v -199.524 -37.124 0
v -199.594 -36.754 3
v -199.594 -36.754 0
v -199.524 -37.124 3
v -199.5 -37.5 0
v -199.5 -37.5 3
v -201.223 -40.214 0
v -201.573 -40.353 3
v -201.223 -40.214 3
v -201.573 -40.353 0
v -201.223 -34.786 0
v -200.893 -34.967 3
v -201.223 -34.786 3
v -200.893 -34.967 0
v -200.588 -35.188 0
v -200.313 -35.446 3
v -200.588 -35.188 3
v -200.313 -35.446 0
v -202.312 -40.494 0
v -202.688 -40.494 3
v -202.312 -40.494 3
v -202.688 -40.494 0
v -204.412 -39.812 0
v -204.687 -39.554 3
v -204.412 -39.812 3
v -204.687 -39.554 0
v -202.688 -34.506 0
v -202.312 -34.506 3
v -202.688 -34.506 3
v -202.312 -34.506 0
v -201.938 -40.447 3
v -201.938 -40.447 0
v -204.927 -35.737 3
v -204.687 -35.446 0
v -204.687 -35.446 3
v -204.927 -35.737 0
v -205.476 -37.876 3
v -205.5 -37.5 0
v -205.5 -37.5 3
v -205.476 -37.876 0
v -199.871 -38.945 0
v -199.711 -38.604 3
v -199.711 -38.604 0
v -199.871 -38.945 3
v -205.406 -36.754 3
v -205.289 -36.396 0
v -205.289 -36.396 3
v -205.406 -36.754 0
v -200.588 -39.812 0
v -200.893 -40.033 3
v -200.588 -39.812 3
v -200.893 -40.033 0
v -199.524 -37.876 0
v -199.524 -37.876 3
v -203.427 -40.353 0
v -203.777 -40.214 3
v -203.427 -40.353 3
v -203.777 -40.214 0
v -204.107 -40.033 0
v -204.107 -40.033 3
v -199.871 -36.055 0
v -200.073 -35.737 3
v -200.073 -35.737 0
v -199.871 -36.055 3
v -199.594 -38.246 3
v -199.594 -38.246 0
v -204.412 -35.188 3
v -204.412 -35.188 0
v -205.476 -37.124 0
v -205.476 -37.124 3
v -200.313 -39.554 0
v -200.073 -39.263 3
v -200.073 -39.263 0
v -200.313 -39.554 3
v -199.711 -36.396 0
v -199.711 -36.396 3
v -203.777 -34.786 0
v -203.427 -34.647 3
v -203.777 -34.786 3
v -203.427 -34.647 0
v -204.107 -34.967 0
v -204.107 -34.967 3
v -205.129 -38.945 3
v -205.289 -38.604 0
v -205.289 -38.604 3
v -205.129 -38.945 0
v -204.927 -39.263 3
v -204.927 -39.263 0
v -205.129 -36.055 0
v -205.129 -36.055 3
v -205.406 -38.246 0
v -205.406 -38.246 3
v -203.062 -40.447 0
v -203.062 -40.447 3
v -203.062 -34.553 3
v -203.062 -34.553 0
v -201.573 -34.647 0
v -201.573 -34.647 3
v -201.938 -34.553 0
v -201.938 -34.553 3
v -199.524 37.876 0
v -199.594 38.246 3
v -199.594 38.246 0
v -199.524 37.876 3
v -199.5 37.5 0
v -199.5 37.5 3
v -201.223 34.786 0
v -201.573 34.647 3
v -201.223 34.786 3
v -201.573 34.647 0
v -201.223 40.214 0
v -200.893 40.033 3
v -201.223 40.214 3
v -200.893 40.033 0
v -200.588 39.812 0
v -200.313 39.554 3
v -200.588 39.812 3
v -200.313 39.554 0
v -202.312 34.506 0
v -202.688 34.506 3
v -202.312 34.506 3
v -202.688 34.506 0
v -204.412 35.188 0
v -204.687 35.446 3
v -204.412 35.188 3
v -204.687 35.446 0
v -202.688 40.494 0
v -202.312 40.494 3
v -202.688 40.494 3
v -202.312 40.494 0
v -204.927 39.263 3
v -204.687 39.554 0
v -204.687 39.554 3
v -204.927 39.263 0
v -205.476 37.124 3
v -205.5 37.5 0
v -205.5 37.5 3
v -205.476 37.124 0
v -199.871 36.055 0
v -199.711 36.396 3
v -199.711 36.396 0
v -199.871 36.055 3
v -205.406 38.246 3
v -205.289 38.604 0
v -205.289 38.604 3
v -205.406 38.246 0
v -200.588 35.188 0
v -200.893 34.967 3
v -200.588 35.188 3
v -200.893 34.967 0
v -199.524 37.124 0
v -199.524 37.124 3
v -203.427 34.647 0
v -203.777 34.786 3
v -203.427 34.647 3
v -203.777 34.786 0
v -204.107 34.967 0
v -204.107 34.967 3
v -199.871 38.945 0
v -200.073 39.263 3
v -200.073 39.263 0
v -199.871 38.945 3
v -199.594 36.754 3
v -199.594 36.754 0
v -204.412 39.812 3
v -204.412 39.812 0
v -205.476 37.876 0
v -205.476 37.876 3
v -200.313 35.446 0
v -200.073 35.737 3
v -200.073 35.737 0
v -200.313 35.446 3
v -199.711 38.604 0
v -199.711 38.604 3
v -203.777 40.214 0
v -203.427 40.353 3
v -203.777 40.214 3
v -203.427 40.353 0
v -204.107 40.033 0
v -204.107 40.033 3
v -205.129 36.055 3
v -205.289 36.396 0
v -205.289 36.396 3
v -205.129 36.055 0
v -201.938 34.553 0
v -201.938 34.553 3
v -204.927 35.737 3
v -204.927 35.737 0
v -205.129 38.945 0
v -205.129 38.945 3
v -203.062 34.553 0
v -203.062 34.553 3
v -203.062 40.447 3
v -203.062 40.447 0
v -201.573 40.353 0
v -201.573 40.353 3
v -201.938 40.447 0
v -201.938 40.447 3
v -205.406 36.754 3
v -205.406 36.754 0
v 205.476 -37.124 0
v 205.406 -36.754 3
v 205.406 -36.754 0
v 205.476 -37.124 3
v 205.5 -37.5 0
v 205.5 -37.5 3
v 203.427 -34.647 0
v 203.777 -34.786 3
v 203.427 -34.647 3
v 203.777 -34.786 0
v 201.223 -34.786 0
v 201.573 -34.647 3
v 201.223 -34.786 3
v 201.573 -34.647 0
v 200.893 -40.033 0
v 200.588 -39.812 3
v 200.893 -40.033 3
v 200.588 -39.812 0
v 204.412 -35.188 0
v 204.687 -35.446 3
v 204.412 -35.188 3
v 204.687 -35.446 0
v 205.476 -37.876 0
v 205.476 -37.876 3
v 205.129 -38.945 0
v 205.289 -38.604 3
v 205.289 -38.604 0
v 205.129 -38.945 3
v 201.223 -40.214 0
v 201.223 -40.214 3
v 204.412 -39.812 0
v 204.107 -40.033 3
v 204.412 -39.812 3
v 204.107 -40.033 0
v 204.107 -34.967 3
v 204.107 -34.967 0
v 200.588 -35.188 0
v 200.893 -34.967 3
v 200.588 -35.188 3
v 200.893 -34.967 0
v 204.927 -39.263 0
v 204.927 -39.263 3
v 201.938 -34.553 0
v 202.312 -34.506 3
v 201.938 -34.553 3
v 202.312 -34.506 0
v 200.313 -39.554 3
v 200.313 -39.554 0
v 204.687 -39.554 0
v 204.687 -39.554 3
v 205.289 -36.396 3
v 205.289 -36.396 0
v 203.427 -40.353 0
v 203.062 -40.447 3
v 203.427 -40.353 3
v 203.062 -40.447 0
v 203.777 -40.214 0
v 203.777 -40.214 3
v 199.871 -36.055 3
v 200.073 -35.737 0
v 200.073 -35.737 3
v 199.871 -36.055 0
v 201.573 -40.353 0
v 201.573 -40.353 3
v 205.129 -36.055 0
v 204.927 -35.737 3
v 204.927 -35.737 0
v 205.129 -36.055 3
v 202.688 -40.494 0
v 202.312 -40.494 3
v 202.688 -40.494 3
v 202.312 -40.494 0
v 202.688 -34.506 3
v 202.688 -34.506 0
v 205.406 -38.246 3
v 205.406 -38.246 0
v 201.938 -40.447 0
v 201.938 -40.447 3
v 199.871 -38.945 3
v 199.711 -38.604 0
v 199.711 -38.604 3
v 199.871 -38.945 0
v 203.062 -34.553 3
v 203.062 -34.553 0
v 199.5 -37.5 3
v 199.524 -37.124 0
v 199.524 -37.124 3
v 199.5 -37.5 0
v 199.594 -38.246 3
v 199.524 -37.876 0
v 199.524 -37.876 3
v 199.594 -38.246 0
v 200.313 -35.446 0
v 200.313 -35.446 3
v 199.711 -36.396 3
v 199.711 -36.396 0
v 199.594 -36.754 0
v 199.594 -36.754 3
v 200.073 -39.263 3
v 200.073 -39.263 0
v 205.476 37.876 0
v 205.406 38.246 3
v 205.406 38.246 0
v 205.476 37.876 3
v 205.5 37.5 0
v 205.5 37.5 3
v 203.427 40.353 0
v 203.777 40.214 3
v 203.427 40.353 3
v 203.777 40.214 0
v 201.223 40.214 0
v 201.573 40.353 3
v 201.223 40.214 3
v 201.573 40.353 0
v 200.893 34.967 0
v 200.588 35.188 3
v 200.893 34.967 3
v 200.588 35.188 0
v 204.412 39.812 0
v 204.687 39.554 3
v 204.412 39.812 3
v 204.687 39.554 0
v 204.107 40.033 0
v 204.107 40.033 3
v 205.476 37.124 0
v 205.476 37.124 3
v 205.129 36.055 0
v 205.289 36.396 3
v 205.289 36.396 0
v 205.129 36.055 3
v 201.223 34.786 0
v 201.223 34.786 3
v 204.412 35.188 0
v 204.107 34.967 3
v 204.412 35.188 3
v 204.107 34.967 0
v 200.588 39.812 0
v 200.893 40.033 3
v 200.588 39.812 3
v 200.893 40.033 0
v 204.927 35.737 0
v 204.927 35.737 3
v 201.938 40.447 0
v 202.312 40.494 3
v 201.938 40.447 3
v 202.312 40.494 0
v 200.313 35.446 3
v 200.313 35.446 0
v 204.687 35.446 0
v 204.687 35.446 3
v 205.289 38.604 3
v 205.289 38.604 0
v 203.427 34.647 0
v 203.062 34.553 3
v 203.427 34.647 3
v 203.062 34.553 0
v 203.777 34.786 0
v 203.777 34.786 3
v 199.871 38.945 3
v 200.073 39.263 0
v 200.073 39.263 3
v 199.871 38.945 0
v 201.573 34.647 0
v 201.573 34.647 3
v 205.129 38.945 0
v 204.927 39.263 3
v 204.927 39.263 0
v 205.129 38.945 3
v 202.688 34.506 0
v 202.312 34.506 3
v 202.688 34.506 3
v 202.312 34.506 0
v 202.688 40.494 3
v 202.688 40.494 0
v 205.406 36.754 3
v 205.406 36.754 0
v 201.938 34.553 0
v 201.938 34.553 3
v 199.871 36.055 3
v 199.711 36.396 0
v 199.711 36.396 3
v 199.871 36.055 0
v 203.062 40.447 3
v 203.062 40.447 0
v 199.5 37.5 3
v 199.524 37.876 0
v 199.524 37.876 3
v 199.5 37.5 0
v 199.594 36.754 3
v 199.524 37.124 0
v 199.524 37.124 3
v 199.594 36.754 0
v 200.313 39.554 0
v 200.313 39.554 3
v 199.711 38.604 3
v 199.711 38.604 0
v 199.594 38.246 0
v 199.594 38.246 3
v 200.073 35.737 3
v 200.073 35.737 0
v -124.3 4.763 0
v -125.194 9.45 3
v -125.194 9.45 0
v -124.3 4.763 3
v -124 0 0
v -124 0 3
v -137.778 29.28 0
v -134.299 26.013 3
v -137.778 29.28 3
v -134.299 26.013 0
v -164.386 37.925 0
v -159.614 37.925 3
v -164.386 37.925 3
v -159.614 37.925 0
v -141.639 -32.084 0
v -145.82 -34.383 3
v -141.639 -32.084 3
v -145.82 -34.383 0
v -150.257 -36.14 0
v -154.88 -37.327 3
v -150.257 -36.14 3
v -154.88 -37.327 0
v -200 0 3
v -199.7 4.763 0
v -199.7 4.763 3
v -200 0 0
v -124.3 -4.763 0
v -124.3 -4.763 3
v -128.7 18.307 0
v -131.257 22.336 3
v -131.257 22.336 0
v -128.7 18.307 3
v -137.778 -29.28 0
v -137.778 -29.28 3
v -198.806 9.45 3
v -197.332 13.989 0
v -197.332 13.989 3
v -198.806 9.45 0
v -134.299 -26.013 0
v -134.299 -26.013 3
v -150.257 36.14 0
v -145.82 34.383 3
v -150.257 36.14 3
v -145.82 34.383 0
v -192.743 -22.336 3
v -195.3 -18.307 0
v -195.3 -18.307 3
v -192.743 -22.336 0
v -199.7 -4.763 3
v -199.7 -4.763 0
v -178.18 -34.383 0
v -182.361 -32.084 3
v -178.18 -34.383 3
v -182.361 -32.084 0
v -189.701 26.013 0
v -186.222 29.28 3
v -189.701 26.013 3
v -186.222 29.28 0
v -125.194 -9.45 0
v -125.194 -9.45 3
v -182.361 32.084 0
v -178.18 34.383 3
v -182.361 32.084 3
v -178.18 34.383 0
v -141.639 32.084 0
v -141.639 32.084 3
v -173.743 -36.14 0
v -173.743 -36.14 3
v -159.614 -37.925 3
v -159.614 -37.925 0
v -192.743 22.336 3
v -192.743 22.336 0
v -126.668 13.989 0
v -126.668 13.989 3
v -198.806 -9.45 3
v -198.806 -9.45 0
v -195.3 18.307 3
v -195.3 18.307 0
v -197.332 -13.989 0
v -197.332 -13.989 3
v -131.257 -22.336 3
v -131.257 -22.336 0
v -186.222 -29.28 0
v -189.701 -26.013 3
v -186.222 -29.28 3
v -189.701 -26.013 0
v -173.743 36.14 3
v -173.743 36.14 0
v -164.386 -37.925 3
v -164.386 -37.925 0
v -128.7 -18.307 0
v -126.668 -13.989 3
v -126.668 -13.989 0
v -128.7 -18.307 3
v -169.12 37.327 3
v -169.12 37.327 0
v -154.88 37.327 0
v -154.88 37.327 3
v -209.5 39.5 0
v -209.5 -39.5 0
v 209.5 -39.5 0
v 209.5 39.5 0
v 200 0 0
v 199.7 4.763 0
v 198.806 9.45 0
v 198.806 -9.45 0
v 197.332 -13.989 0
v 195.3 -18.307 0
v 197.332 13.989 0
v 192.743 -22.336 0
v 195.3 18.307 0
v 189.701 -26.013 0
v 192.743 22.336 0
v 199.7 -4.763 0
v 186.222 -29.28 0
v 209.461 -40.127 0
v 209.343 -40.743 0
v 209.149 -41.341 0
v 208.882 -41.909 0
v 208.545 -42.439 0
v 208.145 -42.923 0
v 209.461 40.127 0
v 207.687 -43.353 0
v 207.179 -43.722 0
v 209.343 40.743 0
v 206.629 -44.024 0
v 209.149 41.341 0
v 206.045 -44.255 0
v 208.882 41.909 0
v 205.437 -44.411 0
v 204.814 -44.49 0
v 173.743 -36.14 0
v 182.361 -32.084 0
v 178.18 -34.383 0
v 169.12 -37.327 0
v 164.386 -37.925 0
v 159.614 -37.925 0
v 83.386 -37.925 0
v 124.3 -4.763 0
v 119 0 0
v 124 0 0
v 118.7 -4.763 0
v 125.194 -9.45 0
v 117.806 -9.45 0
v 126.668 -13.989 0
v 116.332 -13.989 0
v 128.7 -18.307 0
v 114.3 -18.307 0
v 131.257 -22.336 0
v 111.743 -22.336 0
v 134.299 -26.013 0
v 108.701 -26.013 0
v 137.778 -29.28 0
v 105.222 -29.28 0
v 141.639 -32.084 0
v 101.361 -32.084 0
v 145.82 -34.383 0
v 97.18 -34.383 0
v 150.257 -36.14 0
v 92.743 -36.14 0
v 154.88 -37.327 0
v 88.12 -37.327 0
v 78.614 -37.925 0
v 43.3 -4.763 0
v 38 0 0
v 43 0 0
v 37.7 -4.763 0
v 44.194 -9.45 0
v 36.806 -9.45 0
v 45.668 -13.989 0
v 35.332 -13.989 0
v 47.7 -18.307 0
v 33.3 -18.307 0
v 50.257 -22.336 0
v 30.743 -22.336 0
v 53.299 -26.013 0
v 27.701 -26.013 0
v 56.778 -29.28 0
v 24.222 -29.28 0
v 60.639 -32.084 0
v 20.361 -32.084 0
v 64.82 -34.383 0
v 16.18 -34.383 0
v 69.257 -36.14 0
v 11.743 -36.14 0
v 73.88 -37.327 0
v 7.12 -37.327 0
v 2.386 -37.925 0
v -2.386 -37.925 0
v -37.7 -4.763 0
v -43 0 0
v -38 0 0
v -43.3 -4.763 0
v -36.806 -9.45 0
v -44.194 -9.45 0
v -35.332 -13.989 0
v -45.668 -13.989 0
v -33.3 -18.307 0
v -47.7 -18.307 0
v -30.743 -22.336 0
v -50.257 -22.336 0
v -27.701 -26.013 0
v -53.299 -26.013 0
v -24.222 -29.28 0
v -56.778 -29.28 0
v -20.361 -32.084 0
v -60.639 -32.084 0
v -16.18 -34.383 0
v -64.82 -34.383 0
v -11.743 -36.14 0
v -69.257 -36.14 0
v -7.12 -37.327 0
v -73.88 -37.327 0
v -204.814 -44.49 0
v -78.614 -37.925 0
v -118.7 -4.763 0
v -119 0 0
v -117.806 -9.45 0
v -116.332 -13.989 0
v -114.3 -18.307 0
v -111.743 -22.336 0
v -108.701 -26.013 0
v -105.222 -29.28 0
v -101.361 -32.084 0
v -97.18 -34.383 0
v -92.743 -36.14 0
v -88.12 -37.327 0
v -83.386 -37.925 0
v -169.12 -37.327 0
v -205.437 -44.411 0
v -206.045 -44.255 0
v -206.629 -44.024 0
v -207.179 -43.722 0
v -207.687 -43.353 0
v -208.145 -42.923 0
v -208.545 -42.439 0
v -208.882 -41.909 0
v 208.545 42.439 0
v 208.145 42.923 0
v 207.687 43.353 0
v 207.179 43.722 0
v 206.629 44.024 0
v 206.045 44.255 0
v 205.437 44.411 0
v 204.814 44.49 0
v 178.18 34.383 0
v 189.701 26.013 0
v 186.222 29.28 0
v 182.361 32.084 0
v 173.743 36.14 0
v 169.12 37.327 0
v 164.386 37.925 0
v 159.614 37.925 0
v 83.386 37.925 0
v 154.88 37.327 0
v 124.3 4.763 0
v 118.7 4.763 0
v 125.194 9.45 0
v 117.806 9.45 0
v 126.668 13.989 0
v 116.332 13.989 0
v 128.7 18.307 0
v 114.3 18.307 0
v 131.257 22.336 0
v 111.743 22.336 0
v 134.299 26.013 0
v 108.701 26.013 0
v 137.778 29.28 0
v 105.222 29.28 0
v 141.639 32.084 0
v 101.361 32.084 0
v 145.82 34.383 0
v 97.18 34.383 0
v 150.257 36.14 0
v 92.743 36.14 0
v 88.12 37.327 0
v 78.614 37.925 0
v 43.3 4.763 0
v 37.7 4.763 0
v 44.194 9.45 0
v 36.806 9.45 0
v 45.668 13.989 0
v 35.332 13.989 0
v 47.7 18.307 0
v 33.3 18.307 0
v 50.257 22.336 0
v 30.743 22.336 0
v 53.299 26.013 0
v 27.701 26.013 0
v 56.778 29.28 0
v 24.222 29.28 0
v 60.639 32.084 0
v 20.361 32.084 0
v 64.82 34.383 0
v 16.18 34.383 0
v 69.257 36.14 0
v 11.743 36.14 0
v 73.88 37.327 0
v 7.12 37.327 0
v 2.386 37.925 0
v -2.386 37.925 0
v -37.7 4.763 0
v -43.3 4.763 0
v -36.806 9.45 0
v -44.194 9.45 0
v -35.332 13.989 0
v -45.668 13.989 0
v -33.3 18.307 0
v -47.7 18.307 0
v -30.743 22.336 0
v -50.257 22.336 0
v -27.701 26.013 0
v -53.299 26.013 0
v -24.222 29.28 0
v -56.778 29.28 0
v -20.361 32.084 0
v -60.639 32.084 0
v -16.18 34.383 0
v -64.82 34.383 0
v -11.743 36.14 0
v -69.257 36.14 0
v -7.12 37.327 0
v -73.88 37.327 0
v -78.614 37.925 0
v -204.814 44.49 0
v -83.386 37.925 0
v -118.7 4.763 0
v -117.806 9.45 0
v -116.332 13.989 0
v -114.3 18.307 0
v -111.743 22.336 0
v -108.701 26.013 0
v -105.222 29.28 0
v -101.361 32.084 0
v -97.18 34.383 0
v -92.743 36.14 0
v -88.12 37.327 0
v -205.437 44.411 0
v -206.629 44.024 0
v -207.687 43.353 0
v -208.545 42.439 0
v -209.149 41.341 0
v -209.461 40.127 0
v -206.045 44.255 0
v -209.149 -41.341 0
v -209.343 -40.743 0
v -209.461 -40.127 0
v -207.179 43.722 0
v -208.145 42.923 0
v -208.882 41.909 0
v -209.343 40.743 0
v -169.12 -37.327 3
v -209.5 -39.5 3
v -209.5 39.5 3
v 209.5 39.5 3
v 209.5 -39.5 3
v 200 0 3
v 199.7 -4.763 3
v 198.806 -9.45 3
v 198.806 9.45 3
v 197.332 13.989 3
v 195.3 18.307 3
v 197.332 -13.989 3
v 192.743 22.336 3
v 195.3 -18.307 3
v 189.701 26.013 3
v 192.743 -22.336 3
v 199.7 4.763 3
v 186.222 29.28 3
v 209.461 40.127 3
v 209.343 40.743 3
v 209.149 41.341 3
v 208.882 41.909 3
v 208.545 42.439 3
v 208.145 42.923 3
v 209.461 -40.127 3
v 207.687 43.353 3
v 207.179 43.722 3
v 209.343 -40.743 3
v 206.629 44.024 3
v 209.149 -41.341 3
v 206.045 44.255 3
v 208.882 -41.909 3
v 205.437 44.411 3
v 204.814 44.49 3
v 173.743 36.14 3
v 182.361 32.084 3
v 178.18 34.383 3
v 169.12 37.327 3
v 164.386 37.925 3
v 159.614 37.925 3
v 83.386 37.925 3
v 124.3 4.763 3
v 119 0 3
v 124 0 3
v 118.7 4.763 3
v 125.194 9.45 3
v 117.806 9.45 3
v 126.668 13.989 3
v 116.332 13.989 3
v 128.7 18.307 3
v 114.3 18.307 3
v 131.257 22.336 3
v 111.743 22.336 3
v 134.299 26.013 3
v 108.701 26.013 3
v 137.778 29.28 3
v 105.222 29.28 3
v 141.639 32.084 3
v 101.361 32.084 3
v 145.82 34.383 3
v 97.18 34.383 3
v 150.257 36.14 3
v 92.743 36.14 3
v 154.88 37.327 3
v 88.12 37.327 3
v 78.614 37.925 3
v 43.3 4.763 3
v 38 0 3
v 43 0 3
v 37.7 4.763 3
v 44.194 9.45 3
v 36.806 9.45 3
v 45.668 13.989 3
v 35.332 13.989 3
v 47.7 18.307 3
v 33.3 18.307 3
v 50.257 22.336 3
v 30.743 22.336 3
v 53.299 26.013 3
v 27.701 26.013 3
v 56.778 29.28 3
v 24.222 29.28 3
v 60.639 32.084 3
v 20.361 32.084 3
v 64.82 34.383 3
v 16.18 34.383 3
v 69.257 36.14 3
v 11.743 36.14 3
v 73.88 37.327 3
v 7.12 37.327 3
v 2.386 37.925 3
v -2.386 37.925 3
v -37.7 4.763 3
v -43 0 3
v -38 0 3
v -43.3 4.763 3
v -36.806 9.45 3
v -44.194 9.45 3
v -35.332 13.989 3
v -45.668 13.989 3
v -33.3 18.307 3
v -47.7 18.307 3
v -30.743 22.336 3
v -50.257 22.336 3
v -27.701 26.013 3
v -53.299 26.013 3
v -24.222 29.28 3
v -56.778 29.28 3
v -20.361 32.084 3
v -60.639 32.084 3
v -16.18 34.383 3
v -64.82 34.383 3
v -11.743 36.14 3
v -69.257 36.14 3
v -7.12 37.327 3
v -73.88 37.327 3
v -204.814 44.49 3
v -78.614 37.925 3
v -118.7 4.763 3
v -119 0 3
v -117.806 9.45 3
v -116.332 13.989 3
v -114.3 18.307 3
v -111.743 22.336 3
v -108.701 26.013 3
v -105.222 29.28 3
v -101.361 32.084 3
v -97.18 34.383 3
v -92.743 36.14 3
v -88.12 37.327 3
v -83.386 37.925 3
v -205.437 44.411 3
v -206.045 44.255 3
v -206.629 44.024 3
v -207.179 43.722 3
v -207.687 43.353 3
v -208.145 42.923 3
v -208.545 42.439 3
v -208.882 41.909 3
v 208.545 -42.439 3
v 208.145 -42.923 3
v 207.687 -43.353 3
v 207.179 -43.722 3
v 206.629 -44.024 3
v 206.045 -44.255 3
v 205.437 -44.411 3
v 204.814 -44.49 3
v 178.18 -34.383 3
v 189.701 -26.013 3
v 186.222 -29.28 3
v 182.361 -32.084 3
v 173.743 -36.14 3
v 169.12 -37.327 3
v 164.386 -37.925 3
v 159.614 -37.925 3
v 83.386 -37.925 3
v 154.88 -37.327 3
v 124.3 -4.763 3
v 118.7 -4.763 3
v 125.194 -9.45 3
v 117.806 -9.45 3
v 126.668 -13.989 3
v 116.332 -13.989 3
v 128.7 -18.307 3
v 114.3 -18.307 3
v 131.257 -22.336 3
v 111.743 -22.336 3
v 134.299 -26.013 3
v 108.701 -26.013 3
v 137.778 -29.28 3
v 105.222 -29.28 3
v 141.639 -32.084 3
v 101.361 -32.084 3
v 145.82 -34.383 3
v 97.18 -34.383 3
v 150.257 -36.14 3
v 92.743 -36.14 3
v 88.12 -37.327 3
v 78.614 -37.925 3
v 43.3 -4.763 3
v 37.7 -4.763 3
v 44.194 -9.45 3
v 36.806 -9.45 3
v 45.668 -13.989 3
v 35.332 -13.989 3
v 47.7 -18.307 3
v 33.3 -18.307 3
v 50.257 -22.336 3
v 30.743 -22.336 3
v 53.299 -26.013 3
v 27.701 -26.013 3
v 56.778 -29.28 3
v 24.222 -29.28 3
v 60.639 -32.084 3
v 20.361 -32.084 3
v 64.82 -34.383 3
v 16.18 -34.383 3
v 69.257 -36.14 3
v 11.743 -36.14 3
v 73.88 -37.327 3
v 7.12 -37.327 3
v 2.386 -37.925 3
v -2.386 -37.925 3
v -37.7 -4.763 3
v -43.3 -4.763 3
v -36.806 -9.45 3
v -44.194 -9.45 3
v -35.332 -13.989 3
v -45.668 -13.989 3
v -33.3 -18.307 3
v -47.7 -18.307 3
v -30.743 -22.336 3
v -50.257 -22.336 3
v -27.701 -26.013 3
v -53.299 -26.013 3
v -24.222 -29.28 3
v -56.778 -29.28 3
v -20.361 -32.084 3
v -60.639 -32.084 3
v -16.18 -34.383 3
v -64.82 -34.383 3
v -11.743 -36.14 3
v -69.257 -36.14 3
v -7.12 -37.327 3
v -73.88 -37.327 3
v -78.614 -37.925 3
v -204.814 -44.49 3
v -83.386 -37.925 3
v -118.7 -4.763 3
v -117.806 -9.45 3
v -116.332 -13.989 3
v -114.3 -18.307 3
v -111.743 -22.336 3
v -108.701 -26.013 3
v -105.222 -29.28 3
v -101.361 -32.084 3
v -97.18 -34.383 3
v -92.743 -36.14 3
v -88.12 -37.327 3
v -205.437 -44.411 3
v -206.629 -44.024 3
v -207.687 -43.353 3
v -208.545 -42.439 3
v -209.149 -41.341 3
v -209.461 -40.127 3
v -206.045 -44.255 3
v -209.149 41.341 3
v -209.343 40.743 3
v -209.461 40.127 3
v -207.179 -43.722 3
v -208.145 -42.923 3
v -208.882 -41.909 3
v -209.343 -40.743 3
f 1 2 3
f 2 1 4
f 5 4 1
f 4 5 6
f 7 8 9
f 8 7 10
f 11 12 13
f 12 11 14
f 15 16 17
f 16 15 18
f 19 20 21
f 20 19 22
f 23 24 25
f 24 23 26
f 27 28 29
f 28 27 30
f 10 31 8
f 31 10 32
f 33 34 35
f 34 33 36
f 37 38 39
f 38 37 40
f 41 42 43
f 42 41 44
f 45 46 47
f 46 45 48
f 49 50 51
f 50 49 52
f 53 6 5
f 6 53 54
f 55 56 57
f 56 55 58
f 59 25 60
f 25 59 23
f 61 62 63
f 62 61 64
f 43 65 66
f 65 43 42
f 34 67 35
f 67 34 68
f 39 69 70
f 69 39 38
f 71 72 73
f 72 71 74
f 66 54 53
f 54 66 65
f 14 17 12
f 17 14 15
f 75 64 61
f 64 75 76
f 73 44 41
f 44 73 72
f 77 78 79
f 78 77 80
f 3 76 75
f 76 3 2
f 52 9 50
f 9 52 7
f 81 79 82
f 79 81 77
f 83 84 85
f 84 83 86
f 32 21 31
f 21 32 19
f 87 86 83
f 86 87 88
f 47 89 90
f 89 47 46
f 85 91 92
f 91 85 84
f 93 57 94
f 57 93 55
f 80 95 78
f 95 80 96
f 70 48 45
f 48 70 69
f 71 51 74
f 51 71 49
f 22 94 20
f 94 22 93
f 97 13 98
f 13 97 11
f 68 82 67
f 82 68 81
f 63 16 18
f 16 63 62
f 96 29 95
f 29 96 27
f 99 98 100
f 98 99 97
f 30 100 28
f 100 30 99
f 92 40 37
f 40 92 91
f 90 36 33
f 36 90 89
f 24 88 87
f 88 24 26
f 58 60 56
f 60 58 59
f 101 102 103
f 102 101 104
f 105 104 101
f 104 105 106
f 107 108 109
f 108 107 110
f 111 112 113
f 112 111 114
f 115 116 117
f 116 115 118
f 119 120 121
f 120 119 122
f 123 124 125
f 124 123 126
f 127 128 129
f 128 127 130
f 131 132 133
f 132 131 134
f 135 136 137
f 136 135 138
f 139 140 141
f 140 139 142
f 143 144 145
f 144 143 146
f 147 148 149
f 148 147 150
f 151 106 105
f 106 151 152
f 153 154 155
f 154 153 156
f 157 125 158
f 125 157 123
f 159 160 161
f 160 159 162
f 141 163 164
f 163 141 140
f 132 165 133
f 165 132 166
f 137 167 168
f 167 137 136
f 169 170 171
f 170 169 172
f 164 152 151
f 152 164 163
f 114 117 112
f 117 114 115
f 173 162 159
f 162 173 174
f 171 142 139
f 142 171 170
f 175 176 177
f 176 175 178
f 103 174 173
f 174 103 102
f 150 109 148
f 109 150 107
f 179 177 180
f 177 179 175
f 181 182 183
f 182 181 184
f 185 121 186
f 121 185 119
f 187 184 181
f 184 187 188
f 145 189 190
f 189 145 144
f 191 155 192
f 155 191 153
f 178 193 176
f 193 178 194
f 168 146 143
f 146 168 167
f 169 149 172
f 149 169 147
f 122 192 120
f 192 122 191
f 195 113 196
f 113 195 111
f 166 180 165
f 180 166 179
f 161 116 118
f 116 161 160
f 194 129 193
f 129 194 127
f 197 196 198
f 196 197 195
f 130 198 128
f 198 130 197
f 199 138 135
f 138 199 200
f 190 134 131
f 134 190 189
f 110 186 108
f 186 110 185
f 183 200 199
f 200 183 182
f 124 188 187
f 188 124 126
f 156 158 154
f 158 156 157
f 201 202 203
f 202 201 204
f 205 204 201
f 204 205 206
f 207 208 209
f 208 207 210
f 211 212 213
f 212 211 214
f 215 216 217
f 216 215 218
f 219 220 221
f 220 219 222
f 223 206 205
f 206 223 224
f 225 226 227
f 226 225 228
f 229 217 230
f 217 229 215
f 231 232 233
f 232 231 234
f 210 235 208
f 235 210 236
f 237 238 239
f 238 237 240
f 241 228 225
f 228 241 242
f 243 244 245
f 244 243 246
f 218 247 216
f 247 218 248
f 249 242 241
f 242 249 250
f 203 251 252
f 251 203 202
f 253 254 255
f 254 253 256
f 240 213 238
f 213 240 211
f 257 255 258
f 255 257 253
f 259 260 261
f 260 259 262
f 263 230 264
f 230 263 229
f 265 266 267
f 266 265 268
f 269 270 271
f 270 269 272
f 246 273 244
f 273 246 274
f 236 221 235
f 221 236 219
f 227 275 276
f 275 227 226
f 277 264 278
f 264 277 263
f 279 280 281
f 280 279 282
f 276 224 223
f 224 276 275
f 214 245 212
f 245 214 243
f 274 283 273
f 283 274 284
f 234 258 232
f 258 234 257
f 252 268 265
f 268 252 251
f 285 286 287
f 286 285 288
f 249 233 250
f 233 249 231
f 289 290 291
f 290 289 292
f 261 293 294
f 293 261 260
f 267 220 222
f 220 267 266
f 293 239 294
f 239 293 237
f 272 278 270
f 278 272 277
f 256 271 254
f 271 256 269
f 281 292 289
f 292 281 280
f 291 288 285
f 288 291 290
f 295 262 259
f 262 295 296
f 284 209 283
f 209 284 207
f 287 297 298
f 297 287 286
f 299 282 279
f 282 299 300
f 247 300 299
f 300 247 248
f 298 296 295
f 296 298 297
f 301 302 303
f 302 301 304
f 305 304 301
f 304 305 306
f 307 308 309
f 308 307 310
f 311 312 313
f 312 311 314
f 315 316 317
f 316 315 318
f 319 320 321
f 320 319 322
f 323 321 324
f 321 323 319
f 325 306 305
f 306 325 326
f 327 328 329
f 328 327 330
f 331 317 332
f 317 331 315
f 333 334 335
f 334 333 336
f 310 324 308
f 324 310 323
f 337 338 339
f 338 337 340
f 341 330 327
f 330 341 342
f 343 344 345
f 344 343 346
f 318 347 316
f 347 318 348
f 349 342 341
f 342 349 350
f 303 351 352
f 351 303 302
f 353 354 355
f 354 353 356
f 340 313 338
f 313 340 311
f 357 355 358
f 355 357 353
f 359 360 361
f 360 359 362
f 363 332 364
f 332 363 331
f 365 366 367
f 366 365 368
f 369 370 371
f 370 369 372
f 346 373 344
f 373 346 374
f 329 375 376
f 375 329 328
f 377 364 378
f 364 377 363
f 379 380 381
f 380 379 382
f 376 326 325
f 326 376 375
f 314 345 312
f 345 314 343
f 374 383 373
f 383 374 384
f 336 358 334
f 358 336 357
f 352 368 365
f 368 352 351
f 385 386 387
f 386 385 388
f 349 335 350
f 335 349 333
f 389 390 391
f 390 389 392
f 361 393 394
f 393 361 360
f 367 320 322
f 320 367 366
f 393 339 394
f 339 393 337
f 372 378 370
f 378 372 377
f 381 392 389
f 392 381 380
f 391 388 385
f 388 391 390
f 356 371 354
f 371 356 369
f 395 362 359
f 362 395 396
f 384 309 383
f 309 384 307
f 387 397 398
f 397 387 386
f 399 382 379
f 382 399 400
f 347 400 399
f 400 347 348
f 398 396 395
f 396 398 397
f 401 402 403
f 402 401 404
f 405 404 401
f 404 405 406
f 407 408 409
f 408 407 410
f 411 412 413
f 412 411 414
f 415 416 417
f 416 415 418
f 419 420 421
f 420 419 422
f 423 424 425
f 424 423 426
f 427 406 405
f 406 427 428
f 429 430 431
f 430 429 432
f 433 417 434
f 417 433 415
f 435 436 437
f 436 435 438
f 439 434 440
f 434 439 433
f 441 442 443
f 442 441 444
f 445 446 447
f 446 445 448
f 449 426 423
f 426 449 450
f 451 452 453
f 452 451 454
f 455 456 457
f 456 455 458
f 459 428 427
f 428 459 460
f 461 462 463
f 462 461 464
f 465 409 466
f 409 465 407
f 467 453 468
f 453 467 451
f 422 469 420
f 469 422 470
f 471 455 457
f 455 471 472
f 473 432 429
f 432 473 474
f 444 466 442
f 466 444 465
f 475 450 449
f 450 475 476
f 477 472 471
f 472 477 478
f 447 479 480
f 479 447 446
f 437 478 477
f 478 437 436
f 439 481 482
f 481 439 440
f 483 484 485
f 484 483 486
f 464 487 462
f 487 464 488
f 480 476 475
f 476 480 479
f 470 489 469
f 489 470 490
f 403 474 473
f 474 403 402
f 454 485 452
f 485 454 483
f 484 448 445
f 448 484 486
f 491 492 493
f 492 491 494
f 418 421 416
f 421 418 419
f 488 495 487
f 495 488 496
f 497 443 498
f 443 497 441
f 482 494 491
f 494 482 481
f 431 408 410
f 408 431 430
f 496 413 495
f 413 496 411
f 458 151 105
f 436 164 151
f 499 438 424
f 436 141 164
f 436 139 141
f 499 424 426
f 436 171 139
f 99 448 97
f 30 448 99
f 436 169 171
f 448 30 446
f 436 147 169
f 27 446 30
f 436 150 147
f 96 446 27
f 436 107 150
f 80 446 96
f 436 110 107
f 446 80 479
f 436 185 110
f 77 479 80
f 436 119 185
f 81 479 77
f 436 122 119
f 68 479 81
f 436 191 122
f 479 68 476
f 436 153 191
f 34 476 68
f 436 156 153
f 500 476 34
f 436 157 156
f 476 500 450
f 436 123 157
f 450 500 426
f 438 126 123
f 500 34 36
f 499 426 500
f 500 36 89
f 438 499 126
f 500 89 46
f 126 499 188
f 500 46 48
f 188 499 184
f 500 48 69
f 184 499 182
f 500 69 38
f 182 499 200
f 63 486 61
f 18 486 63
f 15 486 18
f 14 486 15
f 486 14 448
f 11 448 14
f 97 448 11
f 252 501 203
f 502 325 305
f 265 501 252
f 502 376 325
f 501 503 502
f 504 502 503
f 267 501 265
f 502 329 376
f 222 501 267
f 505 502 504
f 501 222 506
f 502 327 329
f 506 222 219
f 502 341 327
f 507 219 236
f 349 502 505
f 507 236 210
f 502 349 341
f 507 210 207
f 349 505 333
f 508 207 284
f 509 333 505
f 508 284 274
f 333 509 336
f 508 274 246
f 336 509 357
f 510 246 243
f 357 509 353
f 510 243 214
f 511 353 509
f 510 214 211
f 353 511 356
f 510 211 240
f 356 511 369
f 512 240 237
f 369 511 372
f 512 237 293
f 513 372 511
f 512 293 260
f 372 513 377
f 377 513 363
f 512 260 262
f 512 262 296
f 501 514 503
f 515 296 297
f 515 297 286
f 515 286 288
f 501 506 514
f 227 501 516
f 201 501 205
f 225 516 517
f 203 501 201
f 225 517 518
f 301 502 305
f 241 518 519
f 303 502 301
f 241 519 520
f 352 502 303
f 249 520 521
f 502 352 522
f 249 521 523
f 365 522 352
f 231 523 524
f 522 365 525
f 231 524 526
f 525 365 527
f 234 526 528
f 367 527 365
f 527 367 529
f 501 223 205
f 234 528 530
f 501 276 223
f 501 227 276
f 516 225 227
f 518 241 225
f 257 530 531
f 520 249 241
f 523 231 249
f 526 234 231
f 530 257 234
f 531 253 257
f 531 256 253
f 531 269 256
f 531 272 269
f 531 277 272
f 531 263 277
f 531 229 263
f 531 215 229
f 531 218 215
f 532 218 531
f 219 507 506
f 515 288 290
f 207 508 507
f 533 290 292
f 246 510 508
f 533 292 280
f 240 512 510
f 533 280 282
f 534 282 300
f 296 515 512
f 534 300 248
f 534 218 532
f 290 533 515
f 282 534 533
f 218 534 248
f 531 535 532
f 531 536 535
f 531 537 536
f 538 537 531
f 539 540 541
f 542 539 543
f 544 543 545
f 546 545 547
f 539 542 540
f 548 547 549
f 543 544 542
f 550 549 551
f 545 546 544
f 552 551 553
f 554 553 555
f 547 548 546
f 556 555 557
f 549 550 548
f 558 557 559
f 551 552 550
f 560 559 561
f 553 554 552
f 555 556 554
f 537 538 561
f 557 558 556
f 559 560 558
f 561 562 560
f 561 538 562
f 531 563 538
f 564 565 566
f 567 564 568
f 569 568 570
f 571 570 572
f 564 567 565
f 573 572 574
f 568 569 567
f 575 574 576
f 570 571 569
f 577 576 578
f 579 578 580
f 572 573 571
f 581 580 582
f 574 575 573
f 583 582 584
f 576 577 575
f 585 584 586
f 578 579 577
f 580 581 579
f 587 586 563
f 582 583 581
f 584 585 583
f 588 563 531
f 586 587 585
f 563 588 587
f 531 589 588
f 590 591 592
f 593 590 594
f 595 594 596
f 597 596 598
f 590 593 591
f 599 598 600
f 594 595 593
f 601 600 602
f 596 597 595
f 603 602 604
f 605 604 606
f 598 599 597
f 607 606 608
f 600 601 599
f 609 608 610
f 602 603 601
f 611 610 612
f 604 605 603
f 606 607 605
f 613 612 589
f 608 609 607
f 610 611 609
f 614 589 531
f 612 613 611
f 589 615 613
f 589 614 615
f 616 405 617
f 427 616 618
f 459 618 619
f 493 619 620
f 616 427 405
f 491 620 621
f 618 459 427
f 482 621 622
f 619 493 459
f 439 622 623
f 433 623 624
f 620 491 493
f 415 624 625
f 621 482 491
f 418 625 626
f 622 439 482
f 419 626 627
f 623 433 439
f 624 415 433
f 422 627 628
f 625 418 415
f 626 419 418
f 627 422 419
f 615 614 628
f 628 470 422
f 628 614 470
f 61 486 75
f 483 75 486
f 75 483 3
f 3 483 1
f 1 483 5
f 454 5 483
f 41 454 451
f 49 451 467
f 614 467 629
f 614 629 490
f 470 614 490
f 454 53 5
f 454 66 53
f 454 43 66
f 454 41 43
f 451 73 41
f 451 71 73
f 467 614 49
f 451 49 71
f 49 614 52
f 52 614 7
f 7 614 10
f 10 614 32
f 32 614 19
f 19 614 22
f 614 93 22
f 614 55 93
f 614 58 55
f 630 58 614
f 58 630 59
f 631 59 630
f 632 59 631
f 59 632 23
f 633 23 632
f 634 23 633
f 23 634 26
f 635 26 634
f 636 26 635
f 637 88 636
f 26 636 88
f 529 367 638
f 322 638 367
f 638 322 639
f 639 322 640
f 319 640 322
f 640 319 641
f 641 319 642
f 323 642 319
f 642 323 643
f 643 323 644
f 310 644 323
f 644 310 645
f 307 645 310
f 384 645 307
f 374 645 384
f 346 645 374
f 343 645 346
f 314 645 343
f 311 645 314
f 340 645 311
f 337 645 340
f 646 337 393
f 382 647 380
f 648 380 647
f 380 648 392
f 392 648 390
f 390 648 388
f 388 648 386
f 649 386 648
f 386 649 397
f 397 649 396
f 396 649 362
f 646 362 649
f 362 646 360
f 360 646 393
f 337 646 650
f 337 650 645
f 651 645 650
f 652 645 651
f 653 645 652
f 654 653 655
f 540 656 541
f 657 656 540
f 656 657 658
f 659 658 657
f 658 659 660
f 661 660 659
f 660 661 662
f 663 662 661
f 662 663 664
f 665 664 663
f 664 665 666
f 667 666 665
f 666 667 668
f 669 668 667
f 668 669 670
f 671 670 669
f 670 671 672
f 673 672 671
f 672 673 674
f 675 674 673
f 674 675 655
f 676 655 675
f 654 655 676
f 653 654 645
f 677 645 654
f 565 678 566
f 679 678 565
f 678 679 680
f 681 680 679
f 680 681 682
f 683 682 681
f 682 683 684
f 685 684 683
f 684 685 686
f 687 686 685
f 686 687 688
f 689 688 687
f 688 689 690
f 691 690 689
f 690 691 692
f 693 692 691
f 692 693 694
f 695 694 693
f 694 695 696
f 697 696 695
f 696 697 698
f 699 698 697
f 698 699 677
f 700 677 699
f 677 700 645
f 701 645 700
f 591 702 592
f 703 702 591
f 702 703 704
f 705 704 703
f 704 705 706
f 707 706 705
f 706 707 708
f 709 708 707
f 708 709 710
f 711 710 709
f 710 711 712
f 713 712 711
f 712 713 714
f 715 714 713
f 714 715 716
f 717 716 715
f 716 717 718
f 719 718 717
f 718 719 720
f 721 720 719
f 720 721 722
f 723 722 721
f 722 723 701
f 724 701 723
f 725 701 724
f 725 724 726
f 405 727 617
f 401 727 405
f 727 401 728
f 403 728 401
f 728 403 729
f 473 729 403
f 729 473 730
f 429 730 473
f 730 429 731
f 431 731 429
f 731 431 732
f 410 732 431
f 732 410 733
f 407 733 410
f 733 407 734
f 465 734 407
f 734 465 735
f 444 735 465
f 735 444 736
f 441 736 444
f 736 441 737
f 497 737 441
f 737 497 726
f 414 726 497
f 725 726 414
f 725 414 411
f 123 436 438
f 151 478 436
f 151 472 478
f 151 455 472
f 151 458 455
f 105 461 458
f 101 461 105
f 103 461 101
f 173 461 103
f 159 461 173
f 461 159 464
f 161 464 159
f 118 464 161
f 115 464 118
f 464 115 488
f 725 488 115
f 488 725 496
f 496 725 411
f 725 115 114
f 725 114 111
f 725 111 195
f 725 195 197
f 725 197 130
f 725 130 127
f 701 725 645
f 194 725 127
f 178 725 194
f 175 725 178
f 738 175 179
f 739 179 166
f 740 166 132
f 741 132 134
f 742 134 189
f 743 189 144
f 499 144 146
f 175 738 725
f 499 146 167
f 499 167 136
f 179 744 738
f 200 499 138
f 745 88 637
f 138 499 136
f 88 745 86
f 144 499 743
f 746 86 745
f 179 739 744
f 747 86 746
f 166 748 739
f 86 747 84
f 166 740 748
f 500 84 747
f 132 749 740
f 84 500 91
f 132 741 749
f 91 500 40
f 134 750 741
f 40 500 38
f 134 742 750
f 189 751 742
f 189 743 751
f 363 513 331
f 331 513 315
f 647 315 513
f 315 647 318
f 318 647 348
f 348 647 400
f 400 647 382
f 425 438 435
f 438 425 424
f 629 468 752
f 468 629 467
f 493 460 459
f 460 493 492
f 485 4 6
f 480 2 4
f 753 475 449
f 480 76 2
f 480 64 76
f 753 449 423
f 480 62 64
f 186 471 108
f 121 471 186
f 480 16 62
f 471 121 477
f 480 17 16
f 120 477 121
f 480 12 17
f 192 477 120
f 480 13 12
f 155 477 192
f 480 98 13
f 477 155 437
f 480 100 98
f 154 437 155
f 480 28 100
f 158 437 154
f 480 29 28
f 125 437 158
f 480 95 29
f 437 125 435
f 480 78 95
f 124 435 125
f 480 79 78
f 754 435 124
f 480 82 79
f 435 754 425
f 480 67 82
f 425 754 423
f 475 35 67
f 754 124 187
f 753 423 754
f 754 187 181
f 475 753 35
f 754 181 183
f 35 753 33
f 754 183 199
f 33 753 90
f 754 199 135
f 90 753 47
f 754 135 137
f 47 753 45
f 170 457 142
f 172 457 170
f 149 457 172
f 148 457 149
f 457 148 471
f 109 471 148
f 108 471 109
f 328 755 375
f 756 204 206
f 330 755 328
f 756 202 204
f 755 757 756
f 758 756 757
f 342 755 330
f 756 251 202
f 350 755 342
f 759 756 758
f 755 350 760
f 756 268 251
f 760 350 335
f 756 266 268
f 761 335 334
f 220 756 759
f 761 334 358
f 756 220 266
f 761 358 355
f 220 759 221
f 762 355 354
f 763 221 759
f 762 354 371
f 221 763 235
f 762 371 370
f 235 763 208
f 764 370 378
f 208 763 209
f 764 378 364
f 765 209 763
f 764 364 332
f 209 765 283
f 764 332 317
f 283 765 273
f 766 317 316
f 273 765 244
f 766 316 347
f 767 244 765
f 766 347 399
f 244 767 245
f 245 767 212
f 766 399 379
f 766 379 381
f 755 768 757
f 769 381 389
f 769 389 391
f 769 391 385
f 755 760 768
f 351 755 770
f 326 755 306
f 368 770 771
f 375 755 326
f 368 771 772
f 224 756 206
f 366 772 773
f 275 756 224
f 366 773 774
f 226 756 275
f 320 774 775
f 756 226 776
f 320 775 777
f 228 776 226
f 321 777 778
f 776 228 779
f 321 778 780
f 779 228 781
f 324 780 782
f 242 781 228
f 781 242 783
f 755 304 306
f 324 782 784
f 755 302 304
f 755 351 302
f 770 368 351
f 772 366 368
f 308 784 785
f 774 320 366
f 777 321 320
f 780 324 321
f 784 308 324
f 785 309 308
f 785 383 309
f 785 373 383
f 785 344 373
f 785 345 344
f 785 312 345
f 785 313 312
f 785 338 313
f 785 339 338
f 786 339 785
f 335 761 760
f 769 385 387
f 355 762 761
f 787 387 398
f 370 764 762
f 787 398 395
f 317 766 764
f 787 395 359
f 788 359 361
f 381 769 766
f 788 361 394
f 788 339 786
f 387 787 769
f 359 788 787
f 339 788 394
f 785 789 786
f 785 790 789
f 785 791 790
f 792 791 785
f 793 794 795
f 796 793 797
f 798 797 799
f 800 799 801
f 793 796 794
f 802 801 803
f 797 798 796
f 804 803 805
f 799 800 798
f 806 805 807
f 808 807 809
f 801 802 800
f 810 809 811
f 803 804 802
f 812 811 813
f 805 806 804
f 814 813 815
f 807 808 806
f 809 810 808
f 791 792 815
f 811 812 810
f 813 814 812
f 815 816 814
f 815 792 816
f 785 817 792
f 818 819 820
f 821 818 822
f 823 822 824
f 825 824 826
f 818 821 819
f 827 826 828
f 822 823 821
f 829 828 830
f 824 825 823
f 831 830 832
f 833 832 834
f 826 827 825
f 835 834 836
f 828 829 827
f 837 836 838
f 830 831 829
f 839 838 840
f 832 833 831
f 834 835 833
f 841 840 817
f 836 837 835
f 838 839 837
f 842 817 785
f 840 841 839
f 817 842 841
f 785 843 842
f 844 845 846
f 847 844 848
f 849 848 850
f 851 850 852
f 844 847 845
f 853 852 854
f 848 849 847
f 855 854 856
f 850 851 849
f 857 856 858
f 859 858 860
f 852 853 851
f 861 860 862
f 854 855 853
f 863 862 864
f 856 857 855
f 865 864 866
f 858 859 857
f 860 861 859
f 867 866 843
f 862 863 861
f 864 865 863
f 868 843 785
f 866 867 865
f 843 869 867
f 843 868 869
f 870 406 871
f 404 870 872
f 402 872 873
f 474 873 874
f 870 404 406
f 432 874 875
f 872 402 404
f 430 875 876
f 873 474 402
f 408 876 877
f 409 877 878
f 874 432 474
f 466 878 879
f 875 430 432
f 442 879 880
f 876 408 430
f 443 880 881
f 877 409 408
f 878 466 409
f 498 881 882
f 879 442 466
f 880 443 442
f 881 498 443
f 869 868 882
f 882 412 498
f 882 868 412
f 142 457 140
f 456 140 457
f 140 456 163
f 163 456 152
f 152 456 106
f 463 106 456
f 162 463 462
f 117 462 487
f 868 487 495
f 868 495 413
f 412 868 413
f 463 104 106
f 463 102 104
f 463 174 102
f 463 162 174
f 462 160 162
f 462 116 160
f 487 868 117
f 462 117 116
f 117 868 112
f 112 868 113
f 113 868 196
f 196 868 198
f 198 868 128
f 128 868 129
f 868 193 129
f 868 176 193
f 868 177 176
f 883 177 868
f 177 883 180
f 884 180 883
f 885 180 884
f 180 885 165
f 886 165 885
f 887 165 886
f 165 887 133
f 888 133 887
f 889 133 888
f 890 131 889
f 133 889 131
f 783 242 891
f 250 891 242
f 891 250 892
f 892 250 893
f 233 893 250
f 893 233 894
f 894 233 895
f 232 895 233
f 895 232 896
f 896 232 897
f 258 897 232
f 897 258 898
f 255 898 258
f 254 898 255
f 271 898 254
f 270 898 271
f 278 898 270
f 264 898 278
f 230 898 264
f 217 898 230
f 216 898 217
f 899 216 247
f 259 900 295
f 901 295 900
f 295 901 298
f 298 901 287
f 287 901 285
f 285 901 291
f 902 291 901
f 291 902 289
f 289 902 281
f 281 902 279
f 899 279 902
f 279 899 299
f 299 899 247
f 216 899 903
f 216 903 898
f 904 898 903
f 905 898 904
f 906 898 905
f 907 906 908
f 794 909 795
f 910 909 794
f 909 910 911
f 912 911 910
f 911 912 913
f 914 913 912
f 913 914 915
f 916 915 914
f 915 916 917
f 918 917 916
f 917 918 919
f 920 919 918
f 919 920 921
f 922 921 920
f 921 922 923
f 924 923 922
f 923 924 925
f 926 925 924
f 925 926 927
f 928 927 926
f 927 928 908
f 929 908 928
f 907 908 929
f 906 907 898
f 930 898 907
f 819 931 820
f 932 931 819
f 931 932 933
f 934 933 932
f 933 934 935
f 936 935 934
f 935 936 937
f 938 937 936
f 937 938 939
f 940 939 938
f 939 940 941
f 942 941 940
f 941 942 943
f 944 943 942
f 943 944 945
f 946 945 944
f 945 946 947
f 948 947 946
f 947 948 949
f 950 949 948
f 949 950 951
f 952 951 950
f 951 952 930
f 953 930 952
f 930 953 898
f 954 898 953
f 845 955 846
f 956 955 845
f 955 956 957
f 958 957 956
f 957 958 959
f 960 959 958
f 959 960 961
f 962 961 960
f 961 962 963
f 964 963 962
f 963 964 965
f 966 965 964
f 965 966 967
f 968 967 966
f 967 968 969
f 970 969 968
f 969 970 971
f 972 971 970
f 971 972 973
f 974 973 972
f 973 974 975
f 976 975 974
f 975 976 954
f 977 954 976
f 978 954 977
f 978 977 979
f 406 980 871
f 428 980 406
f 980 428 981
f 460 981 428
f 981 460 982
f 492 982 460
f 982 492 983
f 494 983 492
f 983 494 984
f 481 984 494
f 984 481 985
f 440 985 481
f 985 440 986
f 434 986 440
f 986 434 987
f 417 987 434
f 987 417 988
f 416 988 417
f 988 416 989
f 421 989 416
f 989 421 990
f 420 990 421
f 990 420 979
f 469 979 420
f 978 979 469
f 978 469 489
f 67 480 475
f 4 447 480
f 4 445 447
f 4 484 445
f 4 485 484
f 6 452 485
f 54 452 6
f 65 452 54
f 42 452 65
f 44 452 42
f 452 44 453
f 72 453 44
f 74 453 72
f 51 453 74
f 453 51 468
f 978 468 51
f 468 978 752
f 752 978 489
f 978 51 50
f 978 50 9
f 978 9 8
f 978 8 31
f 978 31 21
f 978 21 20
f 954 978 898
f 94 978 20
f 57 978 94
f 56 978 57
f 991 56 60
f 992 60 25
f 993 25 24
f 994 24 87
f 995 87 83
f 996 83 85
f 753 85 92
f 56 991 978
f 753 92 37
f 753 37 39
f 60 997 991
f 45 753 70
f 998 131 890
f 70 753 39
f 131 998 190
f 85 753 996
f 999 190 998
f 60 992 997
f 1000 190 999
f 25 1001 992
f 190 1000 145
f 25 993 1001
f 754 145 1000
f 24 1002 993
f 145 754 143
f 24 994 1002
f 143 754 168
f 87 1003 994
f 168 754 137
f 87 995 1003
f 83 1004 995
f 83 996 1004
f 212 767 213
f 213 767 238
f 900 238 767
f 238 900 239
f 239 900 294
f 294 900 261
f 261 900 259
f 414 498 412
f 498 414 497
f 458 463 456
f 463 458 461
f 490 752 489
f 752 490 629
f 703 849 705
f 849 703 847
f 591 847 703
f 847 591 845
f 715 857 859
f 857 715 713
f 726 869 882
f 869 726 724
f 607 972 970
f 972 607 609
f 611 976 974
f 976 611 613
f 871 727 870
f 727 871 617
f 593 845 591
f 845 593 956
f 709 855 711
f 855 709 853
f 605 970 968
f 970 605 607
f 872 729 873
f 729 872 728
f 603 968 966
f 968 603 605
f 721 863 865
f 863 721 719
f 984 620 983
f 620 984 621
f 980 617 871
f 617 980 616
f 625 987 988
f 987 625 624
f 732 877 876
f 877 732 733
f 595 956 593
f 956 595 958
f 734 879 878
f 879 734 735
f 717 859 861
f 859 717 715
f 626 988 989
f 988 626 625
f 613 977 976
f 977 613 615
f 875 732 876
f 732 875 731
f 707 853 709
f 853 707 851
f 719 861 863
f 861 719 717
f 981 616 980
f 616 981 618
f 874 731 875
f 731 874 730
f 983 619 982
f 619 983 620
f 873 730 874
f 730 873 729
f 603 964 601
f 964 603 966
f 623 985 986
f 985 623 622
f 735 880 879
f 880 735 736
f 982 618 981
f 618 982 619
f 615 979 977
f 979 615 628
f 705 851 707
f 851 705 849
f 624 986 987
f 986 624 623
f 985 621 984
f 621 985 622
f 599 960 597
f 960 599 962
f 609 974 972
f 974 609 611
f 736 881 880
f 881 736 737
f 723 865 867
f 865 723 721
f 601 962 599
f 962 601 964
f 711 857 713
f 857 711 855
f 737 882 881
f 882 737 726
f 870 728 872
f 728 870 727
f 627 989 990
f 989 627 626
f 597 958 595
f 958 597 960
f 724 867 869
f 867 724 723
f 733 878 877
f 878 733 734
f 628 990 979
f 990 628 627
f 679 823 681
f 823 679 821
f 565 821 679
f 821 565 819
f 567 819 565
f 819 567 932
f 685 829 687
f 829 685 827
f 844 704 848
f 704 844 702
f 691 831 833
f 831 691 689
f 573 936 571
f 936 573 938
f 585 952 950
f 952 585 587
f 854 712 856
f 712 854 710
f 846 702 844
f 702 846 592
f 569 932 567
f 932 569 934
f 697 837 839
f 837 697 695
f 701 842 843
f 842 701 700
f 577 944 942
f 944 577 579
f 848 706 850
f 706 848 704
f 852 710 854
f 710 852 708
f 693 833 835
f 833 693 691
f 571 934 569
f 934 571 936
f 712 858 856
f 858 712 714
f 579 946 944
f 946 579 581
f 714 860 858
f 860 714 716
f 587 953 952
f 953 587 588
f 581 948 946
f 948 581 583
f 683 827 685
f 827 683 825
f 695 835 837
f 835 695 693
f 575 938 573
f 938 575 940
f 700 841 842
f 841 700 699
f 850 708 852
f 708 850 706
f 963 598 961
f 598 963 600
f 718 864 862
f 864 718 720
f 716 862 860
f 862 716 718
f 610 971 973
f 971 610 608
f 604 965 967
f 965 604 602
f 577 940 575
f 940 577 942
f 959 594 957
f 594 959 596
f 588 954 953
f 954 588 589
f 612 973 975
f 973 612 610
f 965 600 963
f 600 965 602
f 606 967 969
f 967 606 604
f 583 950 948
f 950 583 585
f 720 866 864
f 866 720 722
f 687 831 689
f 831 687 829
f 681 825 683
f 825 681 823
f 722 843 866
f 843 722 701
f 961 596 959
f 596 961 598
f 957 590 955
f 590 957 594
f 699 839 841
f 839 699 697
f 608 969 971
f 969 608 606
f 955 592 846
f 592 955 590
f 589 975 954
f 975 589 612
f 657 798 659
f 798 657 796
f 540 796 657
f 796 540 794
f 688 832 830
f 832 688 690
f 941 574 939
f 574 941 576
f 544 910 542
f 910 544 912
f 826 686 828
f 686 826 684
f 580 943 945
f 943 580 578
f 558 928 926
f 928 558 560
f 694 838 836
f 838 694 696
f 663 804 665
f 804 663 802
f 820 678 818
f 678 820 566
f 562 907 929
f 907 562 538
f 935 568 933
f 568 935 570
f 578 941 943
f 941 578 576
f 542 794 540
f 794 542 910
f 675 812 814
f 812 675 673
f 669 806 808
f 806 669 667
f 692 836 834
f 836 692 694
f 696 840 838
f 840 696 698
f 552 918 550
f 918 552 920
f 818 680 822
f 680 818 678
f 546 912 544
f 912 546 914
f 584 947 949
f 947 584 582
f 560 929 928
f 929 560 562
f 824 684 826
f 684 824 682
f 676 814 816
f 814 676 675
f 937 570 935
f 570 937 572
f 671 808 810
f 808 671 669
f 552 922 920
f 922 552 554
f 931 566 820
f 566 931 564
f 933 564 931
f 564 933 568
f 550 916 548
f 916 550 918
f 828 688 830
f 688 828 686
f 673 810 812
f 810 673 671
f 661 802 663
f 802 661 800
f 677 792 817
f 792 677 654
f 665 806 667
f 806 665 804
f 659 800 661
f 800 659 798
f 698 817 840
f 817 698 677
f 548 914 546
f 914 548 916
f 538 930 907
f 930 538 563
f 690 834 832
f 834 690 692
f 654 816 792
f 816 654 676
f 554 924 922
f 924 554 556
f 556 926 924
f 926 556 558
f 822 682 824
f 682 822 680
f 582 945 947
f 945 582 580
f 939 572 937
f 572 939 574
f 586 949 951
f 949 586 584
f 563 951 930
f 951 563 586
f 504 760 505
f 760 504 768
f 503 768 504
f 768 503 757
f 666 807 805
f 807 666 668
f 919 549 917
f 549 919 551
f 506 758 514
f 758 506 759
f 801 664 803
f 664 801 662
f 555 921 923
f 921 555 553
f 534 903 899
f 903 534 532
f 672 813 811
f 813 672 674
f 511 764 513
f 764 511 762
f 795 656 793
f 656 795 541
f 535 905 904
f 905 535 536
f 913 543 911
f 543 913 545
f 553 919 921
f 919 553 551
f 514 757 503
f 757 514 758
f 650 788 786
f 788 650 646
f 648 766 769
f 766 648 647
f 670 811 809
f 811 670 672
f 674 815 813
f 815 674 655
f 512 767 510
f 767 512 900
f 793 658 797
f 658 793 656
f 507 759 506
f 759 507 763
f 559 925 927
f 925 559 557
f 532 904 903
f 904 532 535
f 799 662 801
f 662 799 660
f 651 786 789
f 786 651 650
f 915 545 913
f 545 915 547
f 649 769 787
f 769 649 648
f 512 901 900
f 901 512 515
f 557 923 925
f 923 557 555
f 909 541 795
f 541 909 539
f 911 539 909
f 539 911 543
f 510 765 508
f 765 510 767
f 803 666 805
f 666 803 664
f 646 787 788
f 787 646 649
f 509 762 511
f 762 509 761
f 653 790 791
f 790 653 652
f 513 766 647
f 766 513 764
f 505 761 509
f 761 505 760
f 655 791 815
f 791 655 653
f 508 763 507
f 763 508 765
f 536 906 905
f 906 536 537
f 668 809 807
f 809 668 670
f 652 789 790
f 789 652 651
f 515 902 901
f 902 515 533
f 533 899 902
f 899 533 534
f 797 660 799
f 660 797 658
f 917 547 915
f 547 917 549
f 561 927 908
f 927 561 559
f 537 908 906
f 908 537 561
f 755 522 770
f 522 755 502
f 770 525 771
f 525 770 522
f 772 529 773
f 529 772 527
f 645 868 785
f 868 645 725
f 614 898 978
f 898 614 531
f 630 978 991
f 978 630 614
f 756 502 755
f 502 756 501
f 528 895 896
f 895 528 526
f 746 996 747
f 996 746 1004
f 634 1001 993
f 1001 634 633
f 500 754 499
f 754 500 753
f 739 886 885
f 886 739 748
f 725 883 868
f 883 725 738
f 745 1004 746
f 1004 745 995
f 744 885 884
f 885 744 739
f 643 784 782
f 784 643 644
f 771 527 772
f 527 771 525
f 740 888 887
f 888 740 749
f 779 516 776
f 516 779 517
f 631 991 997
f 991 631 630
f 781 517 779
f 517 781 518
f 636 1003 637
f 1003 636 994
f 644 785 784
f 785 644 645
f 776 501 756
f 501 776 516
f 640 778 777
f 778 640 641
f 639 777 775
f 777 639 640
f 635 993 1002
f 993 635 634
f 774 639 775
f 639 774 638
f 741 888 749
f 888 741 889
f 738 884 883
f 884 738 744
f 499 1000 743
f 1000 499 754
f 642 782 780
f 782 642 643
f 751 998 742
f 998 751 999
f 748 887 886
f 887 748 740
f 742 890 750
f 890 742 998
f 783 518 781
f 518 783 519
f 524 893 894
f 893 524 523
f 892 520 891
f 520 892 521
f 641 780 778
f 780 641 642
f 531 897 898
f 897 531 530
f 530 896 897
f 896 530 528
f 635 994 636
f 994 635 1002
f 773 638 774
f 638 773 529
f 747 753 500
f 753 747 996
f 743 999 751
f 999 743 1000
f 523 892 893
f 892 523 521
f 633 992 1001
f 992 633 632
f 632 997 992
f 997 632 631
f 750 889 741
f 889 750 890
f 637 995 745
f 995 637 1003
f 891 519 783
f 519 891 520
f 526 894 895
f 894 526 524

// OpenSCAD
$fn = 50;


difference() {
	union() {
		hull() {
			translate(v = [-204.5000000000, 39.5000000000, 0]) {
				cylinder(h = 3, r = 5);
			}
			translate(v = [204.5000000000, 39.5000000000, 0]) {
				cylinder(h = 3, r = 5);
			}
			translate(v = [-204.5000000000, -39.5000000000, 0]) {
				cylinder(h = 3, r = 5);
			}
			translate(v = [204.5000000000, -39.5000000000, 0]) {
				cylinder(h = 3, r = 5);
			}
		}
	}
	union() {
		#translate(v = [-202.5000000000, -37.5000000000, -100.0000000000]) {
			cylinder(h = 200, r = 3.0000000000);
		}
		#translate(v = [-202.5000000000, 37.5000000000, -100.0000000000]) {
			cylinder(h = 200, r = 3.0000000000);
		}
		#translate(v = [202.5000000000, -37.5000000000, -100.0000000000]) {
			cylinder(h = 200, r = 3.0000000000);
		}
		#translate(v = [202.5000000000, 37.5000000000, -100.0000000000]) {
			cylinder(h = 200, r = 3.0000000000);
		}
		#translate(v = [-162.0000000000, 0, 0]) {
			cylinder(h = 3, r = 38.0000000000);
		}
		#translate(v = [-81.0000000000, 0, 0]) {
			cylinder(h = 3, r = 38.0000000000);
		}
		#cylinder(h = 3, r = 38.0000000000);
		#translate(v = [81.0000000000, 0, 0]) {
			cylinder(h = 3, r = 38.0000000000);
		}
		#translate(v = [162.0000000000, 0, 0]) {
			cylinder(h = 3, r = 38.0000000000);
		}
	}
}
